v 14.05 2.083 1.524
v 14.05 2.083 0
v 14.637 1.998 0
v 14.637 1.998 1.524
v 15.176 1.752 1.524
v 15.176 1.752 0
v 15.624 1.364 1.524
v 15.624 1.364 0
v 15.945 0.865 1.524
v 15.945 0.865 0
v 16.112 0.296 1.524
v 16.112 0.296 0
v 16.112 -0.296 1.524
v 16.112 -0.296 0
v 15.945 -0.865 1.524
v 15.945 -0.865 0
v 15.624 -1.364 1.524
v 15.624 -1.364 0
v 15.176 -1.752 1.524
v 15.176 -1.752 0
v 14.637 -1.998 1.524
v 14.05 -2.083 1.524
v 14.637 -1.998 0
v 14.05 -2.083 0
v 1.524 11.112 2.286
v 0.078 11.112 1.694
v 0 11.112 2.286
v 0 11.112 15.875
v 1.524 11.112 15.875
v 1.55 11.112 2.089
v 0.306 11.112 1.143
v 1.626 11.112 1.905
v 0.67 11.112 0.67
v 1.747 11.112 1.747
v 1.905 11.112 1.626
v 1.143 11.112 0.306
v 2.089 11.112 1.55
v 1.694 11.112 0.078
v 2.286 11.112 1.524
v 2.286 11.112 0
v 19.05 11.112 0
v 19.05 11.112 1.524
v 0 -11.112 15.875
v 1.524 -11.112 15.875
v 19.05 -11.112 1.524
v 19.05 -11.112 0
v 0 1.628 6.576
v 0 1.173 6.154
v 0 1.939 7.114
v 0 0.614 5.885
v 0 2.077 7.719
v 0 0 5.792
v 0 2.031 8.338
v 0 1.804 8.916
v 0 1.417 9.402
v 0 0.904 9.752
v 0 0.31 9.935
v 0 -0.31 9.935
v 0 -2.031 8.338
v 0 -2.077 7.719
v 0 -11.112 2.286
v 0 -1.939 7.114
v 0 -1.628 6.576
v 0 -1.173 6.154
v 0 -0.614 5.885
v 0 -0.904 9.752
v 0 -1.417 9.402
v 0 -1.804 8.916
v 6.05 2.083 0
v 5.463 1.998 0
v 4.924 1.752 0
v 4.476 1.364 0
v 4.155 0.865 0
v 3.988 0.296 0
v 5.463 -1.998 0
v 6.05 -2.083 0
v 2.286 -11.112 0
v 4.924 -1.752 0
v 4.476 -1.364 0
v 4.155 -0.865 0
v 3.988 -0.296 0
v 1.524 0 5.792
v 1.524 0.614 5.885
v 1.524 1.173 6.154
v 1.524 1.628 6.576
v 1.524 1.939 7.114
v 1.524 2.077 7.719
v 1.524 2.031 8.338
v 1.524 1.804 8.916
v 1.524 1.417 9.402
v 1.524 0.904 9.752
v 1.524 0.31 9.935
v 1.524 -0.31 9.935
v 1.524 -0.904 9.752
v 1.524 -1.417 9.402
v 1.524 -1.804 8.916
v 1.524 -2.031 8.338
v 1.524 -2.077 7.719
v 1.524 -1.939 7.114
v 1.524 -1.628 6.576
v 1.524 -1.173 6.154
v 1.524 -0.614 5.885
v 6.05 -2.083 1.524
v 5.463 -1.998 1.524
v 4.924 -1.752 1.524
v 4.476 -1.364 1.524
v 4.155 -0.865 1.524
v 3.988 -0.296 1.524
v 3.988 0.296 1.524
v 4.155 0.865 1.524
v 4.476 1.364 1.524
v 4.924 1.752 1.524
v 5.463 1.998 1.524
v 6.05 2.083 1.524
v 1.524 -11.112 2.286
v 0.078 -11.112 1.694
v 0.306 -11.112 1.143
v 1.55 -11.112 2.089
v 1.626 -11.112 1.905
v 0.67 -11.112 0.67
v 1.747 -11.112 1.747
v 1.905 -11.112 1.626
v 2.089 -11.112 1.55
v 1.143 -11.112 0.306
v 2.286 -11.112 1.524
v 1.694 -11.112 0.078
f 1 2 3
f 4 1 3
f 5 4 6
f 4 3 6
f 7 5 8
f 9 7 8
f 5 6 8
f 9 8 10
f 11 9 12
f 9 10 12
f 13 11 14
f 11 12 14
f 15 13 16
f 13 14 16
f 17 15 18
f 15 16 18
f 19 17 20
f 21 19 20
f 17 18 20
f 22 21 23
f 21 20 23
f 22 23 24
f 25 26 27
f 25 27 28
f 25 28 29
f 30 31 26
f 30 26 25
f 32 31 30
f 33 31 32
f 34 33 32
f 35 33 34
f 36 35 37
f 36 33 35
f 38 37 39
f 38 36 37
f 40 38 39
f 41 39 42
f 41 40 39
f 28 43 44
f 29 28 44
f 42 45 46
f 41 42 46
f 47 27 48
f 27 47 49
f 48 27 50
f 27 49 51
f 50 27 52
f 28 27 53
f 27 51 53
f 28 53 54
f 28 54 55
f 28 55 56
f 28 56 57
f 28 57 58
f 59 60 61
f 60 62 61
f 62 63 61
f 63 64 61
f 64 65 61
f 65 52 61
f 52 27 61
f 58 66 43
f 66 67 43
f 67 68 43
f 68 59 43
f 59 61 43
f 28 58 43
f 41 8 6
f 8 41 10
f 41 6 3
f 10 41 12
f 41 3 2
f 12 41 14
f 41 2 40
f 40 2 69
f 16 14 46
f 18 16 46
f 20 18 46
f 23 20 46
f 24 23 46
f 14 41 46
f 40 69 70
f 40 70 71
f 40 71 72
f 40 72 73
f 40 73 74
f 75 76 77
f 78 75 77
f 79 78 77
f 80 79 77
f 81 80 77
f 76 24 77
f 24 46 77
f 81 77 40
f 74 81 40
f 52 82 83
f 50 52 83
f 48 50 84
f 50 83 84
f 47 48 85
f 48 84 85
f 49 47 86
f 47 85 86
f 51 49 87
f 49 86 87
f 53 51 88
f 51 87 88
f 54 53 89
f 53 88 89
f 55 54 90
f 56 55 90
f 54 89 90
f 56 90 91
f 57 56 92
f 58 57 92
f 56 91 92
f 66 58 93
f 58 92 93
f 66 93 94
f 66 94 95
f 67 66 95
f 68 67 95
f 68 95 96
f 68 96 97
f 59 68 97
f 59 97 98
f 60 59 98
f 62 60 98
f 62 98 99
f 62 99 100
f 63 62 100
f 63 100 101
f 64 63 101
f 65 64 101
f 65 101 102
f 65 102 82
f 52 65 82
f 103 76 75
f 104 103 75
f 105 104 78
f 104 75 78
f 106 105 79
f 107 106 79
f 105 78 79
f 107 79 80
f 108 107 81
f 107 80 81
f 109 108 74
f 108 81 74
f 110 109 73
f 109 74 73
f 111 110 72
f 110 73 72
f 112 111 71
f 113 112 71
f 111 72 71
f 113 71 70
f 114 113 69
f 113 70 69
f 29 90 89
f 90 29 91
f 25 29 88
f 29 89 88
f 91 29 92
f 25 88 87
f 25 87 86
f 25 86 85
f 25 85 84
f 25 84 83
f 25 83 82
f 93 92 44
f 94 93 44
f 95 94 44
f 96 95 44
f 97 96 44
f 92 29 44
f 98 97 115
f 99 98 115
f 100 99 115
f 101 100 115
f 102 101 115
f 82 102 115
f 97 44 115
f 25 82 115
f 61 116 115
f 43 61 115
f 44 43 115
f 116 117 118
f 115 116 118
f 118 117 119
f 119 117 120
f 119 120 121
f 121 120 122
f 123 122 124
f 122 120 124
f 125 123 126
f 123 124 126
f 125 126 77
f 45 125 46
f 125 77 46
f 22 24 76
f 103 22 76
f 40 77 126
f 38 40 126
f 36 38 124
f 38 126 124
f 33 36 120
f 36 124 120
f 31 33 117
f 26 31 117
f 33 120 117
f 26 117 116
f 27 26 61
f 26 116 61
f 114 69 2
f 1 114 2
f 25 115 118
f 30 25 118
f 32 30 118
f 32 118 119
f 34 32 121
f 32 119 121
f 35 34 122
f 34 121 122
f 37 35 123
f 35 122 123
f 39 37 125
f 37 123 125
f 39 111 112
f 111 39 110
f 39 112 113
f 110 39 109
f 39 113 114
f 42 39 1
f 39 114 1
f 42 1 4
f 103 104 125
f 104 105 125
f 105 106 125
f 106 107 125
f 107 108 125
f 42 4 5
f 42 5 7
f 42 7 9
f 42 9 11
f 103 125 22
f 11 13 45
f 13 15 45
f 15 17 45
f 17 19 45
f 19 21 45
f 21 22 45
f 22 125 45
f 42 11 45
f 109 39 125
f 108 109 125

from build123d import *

# Parameters (mm, degrees)
EXTRUDE_THIN1_START = -11.1125
EXTRUDE_THIN1_DEPTH = 22.225
SKETCH4_R           = 2.0828
EXTRUDE3_DEPTH      = 27.127838741
CUT_EXTRUDE1_DEPTH  = 28.173622895


# Read off the part's stored shape, not the designer's step: Extrude-Thin1
with BuildPart() as part:
    # Extrude-Thin1 outline → Extrude-Thin1 (new body)
    with BuildSketch(Plane(origin=(0, 0, 0), x_dir=(1, 0, 0), z_dir=(0, 1, 0)).offset(EXTRUDE_THIN1_START)):
        with BuildLine():
            Line((2.286, -1.524), (19.05, -1.524))
            Line((19.05, -1.524), (19.05, 0))
            Line((19.05, 0), (2.286, 0))
            ThreePointArc((2.286, 0), (0.669553898, -0.669553898), (0, -2.286))
            Line((0, -2.286), (0, -15.875))
            Line((0, -15.875), (1.524, -15.875))
            Line((1.524, -15.875), (1.524, -2.286))
            ThreePointArc((1.524, -2.286), (1.747184633, -1.747184633), (2.286, -1.524))
        make_face()
    extrude(amount=EXTRUDE_THIN1_DEPTH)

    # Sketch4 → Extrude3 (cut, through all)
    with BuildSketch(Plane(origin=(1.524, 0, 0), x_dir=(0, 0, -1), z_dir=(1, 0, 0))):
        with Locations((-7.875, 0)):
            Circle(SKETCH4_R)
    extrude(amount=-EXTRUDE3_DEPTH, mode=Mode.SUBTRACT)

    # Sketch6 → Cut-Extrude1 (cut, through all)
    with BuildSketch(Plane.XY):
        with BuildLine():
            Line((6.05, 2.0828), (14.05, 2.0828))
            ThreePointArc((14.05, 2.0828), (16.1328, 0), (14.05, -2.0828))
            Line((14.05, -2.0828), (6.05, -2.0828))
            ThreePointArc((6.05, -2.0828), (3.9672, 0), (6.05, 2.0828))
        make_face()
    extrude(amount=CUT_EXTRUDE1_DEPTH, mode=Mode.SUBTRACT)


solid = part.part
